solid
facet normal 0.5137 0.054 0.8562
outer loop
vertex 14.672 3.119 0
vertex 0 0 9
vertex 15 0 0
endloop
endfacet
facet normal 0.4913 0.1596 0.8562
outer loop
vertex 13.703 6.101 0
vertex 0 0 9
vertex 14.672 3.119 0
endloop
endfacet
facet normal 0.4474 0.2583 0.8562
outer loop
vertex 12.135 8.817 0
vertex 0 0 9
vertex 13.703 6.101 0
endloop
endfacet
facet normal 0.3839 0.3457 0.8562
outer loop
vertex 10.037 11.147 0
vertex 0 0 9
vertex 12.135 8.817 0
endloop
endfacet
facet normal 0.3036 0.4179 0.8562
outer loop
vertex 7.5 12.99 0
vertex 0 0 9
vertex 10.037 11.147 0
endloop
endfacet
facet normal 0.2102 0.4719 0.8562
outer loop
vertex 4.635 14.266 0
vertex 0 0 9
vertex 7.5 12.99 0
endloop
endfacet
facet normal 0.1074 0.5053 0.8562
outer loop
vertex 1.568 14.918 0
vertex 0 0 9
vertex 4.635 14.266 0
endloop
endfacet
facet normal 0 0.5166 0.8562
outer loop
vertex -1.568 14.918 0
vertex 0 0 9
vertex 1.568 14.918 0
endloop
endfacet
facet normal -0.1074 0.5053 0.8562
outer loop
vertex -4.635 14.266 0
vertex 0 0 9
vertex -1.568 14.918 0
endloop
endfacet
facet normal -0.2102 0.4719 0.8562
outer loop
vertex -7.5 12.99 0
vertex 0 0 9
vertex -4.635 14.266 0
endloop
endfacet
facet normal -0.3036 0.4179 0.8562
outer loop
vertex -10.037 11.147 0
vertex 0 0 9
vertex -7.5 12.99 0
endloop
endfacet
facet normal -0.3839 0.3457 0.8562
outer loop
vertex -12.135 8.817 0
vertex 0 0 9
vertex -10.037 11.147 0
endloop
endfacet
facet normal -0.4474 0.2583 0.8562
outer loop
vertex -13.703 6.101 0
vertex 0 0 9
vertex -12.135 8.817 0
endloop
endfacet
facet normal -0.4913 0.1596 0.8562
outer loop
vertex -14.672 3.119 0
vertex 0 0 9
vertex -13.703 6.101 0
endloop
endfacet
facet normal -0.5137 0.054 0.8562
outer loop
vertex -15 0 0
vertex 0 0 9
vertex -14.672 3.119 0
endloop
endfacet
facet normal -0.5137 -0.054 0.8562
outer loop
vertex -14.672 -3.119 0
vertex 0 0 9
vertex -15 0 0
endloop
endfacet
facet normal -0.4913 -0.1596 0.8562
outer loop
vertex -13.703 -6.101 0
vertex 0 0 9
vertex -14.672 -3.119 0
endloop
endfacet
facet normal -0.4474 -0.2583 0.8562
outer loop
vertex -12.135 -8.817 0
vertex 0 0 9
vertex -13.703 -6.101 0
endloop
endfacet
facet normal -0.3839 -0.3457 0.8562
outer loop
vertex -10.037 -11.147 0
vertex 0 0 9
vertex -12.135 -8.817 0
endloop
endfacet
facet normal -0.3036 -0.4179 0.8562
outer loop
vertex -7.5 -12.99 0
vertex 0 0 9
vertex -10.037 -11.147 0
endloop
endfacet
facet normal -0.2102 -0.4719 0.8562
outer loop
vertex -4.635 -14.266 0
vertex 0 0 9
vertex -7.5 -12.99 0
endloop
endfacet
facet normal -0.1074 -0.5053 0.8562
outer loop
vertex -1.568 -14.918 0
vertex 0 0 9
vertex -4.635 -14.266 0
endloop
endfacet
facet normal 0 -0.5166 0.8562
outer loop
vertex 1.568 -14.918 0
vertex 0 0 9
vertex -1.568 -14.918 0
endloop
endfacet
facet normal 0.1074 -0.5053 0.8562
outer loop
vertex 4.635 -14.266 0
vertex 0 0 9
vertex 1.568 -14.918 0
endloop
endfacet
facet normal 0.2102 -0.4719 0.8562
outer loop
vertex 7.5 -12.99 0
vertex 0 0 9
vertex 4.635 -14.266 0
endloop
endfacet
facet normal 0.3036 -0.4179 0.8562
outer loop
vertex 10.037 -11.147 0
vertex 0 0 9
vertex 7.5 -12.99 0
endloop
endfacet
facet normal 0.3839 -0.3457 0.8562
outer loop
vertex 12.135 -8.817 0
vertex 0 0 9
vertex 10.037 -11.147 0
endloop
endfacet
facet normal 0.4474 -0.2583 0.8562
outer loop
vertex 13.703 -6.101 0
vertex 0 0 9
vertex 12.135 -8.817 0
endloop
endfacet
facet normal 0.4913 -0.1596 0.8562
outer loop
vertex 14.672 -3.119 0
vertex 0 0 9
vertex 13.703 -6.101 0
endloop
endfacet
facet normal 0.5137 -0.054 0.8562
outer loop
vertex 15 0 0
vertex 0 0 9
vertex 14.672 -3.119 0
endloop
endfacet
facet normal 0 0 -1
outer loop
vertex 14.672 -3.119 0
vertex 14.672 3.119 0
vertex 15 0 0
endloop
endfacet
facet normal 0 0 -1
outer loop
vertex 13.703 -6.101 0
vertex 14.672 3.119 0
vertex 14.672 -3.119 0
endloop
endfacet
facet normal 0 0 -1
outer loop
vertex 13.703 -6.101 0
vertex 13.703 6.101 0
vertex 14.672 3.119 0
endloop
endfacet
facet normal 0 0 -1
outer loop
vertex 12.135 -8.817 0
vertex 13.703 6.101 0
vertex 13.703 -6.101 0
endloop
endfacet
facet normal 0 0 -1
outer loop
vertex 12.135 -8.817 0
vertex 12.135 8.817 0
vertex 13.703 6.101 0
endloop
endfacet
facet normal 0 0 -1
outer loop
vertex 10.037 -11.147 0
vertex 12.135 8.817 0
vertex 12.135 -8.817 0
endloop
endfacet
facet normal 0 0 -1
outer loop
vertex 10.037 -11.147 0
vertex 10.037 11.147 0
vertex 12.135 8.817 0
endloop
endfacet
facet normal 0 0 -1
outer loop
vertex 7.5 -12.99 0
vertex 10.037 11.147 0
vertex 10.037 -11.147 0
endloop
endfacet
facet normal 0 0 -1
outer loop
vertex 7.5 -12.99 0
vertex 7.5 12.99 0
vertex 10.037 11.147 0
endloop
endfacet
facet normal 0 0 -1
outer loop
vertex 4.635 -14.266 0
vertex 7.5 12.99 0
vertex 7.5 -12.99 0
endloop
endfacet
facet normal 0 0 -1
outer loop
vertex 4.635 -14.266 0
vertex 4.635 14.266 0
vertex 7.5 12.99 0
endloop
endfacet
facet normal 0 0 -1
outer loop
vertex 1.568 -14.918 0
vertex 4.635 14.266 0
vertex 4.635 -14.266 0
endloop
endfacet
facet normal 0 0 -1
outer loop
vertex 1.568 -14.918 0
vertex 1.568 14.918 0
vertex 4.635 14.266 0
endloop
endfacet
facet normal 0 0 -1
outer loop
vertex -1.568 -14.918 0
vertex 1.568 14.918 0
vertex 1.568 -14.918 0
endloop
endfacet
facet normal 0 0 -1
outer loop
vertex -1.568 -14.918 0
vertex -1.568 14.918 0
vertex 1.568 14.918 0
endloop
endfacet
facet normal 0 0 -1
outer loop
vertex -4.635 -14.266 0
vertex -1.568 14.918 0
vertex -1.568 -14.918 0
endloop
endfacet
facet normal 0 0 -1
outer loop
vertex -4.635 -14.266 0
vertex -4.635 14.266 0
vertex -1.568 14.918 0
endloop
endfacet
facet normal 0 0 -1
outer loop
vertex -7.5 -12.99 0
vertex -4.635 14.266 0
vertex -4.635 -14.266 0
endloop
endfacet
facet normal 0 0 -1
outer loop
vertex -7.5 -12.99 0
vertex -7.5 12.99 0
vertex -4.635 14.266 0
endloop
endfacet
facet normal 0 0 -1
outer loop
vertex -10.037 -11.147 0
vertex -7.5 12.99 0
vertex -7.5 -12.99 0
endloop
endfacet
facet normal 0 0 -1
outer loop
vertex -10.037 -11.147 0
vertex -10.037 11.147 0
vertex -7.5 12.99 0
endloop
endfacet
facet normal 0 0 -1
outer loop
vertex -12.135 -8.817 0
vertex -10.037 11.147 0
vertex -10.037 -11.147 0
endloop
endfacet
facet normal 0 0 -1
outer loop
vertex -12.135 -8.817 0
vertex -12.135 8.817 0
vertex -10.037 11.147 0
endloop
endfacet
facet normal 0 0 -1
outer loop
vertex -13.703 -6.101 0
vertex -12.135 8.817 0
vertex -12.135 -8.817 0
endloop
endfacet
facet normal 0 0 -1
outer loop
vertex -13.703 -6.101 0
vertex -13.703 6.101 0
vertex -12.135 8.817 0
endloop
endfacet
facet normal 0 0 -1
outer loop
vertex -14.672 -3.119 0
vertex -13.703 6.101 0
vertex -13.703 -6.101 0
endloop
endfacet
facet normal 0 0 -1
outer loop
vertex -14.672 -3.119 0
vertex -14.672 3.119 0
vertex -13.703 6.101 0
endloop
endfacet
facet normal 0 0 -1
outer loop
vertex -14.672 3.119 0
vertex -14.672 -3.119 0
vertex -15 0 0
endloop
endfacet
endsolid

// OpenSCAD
// Generated by SolidPython 1.0.1 on 2020-07-29 00:46:43


cylinder(h = 9, r1 = 15, r2 = 0);
/***********************************************
*********      SolidPython code:      **********
************************************************
 
# import packages: SolidPython
from solid import *
from solid.utils import *
from itertools import chain, combinations, permutations


class Resize:

    def __init__(self, scad_file):
        self.scad_file = scad_file
        #self.scad_file = import_scad(scad_file)
        # cone/cylinder param:
        self.r1 = 0
        self.r2 = 0
        self.h = 0
        # rectangular prism param:
        self.w = 0
        self.l = 0
        # ellipse param:
        self.r = 0

    # import OpenScad code (file name corresponds to shape)


    # classify shape + parameters
    def assign(self, param1, param2, param3):
        if self.scad_file == 'cone.scad':
            self.r1 = param1
            self.r2 = param2
            self.h = param3
        elif self.scad_file == 'cylinder.scad':
            self.r1 = param1
            self.r2 = param2
            self.h = param3
        elif self.scad_file == 'rectangularPrism.scad':
            self.h = param1
            self.l = param2
            self.w = param3
        else:
            self.r = param1
            self.h = param2

    # resize parameters
    def iterate(self):
        x = range(3, 20, 2)
        i = 1
        if self.scad_file == 'cone.scad':
            tempList = list(permutations(x, 2))
            for temp in tempList:
                param1 = temp[0]
                param2 = temp[1]
                filepath = 'produced_scad_files/' + 'cone' + str(param1) + '_' + str(param2) + '_' + '.scad'
                scad_render_to_file(cylinder(h=param1, r1=param2, r2=0), filepath)

        elif self.scad_file == 'cylinder.scad':
            tempList = list(permutations(x, 3))
            for temp in tempList:
                param1 = temp[0]
                param2 = temp[1]
                filepath = 'produced_scad_files/' + 'cylinder' + str(param1) + '_' + str(param2) + '_' + '.scad'
                scad_render_to_file(cylinder(h=param1, r1=param2, r2=param2), filepath)

        elif self.scad_file == 'rectangularPrism.scad':
            tempList = list(permutations(x, 3))
            for temp in tempList:
                param1 = temp[0]
                param2 = temp[1]
                param3 = temp[2]
                filepath = 'produced_scad_files/' + 'rectangularPrism' + str(param1) + '_' + str(param2) + '_' + str(
                    param3) + '.scad'
                scad_render_to_file(cube(size=(param1, param2, param3)), filepath)

        elif self.scad_file == 'ellipse.scad':
            tempList = list(permutations(x, 4))
            for temp in tempList:
                param1 = temp[0]
                param2 = temp[1]
                param3 = temp[2]
                param4 = temp[3]
                filepath = 'produced_scad_files/' + 'ellipse' + str(param1) + '_' + str(param2) + '_' + str(param3) + '_' + str(param4) + '.scad'
                scad_render_to_file(scale([param1, param2, param3])(sphere(r=param4)), filepath)

    def render_to_scadfile(self):
        scad_render_to_file(scad, 'example.scad') 
 
************************************************/
